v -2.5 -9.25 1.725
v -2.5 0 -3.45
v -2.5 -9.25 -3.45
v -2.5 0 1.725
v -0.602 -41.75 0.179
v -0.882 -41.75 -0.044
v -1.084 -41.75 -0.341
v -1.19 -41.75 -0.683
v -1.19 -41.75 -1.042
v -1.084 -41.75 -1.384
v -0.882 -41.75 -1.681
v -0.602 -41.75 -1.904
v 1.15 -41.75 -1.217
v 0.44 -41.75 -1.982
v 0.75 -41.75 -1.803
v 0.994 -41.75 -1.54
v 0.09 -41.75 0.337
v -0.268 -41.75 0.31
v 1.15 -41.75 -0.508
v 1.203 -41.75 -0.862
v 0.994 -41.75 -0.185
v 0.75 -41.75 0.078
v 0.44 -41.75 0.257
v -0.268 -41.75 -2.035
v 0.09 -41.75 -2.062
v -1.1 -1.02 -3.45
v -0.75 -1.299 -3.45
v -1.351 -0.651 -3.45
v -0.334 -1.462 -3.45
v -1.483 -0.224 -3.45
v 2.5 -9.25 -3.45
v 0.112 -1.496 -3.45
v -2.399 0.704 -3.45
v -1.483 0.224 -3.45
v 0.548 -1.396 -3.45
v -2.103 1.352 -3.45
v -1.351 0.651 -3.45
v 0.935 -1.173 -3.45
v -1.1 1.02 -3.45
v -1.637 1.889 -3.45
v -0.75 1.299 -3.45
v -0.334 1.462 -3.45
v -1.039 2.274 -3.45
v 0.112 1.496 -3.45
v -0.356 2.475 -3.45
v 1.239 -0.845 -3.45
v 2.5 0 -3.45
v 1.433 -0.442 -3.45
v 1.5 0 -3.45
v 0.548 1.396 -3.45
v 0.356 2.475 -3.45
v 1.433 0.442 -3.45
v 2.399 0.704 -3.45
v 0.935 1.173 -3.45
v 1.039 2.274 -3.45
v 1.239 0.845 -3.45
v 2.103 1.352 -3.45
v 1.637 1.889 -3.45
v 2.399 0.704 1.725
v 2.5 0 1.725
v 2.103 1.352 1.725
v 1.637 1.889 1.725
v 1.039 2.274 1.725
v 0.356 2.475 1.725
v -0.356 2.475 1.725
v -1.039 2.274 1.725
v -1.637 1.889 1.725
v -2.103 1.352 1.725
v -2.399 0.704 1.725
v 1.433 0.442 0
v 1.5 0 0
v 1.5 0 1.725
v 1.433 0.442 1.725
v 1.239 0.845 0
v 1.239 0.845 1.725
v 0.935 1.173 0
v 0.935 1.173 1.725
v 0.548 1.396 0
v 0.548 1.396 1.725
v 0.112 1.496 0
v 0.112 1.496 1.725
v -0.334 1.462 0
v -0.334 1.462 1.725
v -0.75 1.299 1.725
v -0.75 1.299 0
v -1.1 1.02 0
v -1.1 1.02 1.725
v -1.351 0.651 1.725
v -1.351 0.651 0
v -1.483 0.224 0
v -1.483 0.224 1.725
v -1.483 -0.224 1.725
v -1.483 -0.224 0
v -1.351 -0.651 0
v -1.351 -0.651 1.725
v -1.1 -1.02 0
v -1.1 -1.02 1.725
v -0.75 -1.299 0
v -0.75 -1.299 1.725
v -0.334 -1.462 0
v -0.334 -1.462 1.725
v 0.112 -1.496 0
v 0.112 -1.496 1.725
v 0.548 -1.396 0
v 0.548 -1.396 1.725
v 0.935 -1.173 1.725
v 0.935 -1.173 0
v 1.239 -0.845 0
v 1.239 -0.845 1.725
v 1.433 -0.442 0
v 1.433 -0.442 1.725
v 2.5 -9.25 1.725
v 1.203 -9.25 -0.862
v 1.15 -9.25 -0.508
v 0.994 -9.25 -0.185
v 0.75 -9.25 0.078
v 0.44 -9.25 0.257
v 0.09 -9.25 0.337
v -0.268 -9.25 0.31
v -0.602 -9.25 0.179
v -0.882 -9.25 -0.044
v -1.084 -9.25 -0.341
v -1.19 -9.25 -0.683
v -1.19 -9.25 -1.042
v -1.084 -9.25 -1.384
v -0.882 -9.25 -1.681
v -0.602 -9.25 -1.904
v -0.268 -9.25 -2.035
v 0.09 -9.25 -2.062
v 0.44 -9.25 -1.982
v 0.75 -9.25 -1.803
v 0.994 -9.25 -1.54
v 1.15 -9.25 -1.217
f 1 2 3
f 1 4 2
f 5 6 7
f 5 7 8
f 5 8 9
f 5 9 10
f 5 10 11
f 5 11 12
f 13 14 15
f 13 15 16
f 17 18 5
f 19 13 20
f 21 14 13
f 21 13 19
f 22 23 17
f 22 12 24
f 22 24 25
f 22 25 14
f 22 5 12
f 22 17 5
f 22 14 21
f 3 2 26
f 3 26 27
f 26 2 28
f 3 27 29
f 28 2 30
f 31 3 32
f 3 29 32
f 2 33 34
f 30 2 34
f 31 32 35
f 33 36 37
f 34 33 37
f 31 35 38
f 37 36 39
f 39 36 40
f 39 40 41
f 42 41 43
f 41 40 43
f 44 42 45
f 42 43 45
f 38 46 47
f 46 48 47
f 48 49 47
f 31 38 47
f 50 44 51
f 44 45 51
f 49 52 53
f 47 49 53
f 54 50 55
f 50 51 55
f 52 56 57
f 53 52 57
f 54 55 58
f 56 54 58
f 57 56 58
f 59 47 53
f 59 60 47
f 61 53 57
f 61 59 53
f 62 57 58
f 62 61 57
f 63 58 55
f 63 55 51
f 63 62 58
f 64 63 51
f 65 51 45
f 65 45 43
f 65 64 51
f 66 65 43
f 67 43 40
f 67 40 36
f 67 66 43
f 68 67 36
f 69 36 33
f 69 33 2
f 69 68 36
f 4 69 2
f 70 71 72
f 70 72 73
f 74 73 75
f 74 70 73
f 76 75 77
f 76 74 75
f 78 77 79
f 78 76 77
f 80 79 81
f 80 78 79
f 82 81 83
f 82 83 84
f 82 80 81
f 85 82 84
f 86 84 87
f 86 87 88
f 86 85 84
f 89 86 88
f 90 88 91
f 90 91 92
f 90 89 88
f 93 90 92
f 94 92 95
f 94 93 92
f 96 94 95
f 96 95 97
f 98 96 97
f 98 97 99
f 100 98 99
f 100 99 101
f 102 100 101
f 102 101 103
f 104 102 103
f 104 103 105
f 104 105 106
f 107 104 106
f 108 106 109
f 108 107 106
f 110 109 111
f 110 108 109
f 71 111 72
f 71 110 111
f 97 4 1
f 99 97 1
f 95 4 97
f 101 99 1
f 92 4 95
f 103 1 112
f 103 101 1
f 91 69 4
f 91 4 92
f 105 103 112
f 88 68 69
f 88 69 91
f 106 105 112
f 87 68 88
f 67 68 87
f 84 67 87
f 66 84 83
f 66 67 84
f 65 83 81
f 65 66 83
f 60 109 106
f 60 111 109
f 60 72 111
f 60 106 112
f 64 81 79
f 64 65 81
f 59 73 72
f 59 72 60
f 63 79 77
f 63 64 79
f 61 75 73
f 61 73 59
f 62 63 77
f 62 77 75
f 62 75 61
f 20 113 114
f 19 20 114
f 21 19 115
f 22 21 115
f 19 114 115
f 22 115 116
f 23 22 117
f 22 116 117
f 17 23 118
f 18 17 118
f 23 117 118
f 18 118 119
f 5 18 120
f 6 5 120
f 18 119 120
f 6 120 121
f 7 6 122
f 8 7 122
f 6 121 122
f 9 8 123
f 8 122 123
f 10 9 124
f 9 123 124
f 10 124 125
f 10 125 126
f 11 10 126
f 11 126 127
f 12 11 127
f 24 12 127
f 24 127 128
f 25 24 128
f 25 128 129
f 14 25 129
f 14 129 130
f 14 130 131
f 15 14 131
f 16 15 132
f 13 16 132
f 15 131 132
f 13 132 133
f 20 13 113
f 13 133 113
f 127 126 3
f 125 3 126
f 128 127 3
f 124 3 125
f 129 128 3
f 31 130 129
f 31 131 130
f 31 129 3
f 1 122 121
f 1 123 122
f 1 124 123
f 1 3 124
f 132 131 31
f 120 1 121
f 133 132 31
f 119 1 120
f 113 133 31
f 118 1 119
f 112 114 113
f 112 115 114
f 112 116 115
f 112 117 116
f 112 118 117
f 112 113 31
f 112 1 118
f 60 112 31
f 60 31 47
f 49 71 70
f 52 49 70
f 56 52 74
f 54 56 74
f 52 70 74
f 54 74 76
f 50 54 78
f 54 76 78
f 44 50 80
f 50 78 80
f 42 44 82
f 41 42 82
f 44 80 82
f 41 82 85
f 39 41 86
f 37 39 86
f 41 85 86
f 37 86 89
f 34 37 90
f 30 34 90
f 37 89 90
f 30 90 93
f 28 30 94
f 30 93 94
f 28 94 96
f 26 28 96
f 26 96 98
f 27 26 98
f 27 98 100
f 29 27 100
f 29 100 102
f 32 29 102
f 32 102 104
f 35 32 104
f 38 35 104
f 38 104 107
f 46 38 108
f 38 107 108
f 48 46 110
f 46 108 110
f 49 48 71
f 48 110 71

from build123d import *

# Parameters (mm, degrees)
SKETCH1_R                = 1.5
BOSS_EXTRUDE1_DEPTH      = 1.725
BOSS_EXTRUDE1_DEPTH_BACK = 3.45
SKETCH2_R                = 1.203
BOSS_EXTRUDE2_DEPTH      = 32.5


with BuildPart() as part:
    # Sketch1 → Boss-Extrude1 (new body, two sides)
    with BuildSketch(Plane.XY) as boss_extrude1_sk:
        with BuildLine():
            Line((-2.5, 0), (-2.5, -9.25))
            Line((-2.5, -9.25), (2.5, -9.25))
            Line((2.5, -9.25), (2.5, 0))
            ThreePointArc((2.5, 0), (0, 2.5), (-2.5, 0))
        make_face()
        Circle(SKETCH1_R, mode=Mode.SUBTRACT)
    extrude(amount=BOSS_EXTRUDE1_DEPTH)
    extrude(boss_extrude1_sk.sketch, amount=-BOSS_EXTRUDE1_DEPTH_BACK)

    # Sketch2 → Boss-Extrude2 (add)
    with BuildSketch(Plane.XZ.offset(9.25)):
        with Locations((0, -0.8625)):
            Circle(SKETCH2_R)
    extrude(amount=BOSS_EXTRUDE2_DEPTH)


solid = part.part
